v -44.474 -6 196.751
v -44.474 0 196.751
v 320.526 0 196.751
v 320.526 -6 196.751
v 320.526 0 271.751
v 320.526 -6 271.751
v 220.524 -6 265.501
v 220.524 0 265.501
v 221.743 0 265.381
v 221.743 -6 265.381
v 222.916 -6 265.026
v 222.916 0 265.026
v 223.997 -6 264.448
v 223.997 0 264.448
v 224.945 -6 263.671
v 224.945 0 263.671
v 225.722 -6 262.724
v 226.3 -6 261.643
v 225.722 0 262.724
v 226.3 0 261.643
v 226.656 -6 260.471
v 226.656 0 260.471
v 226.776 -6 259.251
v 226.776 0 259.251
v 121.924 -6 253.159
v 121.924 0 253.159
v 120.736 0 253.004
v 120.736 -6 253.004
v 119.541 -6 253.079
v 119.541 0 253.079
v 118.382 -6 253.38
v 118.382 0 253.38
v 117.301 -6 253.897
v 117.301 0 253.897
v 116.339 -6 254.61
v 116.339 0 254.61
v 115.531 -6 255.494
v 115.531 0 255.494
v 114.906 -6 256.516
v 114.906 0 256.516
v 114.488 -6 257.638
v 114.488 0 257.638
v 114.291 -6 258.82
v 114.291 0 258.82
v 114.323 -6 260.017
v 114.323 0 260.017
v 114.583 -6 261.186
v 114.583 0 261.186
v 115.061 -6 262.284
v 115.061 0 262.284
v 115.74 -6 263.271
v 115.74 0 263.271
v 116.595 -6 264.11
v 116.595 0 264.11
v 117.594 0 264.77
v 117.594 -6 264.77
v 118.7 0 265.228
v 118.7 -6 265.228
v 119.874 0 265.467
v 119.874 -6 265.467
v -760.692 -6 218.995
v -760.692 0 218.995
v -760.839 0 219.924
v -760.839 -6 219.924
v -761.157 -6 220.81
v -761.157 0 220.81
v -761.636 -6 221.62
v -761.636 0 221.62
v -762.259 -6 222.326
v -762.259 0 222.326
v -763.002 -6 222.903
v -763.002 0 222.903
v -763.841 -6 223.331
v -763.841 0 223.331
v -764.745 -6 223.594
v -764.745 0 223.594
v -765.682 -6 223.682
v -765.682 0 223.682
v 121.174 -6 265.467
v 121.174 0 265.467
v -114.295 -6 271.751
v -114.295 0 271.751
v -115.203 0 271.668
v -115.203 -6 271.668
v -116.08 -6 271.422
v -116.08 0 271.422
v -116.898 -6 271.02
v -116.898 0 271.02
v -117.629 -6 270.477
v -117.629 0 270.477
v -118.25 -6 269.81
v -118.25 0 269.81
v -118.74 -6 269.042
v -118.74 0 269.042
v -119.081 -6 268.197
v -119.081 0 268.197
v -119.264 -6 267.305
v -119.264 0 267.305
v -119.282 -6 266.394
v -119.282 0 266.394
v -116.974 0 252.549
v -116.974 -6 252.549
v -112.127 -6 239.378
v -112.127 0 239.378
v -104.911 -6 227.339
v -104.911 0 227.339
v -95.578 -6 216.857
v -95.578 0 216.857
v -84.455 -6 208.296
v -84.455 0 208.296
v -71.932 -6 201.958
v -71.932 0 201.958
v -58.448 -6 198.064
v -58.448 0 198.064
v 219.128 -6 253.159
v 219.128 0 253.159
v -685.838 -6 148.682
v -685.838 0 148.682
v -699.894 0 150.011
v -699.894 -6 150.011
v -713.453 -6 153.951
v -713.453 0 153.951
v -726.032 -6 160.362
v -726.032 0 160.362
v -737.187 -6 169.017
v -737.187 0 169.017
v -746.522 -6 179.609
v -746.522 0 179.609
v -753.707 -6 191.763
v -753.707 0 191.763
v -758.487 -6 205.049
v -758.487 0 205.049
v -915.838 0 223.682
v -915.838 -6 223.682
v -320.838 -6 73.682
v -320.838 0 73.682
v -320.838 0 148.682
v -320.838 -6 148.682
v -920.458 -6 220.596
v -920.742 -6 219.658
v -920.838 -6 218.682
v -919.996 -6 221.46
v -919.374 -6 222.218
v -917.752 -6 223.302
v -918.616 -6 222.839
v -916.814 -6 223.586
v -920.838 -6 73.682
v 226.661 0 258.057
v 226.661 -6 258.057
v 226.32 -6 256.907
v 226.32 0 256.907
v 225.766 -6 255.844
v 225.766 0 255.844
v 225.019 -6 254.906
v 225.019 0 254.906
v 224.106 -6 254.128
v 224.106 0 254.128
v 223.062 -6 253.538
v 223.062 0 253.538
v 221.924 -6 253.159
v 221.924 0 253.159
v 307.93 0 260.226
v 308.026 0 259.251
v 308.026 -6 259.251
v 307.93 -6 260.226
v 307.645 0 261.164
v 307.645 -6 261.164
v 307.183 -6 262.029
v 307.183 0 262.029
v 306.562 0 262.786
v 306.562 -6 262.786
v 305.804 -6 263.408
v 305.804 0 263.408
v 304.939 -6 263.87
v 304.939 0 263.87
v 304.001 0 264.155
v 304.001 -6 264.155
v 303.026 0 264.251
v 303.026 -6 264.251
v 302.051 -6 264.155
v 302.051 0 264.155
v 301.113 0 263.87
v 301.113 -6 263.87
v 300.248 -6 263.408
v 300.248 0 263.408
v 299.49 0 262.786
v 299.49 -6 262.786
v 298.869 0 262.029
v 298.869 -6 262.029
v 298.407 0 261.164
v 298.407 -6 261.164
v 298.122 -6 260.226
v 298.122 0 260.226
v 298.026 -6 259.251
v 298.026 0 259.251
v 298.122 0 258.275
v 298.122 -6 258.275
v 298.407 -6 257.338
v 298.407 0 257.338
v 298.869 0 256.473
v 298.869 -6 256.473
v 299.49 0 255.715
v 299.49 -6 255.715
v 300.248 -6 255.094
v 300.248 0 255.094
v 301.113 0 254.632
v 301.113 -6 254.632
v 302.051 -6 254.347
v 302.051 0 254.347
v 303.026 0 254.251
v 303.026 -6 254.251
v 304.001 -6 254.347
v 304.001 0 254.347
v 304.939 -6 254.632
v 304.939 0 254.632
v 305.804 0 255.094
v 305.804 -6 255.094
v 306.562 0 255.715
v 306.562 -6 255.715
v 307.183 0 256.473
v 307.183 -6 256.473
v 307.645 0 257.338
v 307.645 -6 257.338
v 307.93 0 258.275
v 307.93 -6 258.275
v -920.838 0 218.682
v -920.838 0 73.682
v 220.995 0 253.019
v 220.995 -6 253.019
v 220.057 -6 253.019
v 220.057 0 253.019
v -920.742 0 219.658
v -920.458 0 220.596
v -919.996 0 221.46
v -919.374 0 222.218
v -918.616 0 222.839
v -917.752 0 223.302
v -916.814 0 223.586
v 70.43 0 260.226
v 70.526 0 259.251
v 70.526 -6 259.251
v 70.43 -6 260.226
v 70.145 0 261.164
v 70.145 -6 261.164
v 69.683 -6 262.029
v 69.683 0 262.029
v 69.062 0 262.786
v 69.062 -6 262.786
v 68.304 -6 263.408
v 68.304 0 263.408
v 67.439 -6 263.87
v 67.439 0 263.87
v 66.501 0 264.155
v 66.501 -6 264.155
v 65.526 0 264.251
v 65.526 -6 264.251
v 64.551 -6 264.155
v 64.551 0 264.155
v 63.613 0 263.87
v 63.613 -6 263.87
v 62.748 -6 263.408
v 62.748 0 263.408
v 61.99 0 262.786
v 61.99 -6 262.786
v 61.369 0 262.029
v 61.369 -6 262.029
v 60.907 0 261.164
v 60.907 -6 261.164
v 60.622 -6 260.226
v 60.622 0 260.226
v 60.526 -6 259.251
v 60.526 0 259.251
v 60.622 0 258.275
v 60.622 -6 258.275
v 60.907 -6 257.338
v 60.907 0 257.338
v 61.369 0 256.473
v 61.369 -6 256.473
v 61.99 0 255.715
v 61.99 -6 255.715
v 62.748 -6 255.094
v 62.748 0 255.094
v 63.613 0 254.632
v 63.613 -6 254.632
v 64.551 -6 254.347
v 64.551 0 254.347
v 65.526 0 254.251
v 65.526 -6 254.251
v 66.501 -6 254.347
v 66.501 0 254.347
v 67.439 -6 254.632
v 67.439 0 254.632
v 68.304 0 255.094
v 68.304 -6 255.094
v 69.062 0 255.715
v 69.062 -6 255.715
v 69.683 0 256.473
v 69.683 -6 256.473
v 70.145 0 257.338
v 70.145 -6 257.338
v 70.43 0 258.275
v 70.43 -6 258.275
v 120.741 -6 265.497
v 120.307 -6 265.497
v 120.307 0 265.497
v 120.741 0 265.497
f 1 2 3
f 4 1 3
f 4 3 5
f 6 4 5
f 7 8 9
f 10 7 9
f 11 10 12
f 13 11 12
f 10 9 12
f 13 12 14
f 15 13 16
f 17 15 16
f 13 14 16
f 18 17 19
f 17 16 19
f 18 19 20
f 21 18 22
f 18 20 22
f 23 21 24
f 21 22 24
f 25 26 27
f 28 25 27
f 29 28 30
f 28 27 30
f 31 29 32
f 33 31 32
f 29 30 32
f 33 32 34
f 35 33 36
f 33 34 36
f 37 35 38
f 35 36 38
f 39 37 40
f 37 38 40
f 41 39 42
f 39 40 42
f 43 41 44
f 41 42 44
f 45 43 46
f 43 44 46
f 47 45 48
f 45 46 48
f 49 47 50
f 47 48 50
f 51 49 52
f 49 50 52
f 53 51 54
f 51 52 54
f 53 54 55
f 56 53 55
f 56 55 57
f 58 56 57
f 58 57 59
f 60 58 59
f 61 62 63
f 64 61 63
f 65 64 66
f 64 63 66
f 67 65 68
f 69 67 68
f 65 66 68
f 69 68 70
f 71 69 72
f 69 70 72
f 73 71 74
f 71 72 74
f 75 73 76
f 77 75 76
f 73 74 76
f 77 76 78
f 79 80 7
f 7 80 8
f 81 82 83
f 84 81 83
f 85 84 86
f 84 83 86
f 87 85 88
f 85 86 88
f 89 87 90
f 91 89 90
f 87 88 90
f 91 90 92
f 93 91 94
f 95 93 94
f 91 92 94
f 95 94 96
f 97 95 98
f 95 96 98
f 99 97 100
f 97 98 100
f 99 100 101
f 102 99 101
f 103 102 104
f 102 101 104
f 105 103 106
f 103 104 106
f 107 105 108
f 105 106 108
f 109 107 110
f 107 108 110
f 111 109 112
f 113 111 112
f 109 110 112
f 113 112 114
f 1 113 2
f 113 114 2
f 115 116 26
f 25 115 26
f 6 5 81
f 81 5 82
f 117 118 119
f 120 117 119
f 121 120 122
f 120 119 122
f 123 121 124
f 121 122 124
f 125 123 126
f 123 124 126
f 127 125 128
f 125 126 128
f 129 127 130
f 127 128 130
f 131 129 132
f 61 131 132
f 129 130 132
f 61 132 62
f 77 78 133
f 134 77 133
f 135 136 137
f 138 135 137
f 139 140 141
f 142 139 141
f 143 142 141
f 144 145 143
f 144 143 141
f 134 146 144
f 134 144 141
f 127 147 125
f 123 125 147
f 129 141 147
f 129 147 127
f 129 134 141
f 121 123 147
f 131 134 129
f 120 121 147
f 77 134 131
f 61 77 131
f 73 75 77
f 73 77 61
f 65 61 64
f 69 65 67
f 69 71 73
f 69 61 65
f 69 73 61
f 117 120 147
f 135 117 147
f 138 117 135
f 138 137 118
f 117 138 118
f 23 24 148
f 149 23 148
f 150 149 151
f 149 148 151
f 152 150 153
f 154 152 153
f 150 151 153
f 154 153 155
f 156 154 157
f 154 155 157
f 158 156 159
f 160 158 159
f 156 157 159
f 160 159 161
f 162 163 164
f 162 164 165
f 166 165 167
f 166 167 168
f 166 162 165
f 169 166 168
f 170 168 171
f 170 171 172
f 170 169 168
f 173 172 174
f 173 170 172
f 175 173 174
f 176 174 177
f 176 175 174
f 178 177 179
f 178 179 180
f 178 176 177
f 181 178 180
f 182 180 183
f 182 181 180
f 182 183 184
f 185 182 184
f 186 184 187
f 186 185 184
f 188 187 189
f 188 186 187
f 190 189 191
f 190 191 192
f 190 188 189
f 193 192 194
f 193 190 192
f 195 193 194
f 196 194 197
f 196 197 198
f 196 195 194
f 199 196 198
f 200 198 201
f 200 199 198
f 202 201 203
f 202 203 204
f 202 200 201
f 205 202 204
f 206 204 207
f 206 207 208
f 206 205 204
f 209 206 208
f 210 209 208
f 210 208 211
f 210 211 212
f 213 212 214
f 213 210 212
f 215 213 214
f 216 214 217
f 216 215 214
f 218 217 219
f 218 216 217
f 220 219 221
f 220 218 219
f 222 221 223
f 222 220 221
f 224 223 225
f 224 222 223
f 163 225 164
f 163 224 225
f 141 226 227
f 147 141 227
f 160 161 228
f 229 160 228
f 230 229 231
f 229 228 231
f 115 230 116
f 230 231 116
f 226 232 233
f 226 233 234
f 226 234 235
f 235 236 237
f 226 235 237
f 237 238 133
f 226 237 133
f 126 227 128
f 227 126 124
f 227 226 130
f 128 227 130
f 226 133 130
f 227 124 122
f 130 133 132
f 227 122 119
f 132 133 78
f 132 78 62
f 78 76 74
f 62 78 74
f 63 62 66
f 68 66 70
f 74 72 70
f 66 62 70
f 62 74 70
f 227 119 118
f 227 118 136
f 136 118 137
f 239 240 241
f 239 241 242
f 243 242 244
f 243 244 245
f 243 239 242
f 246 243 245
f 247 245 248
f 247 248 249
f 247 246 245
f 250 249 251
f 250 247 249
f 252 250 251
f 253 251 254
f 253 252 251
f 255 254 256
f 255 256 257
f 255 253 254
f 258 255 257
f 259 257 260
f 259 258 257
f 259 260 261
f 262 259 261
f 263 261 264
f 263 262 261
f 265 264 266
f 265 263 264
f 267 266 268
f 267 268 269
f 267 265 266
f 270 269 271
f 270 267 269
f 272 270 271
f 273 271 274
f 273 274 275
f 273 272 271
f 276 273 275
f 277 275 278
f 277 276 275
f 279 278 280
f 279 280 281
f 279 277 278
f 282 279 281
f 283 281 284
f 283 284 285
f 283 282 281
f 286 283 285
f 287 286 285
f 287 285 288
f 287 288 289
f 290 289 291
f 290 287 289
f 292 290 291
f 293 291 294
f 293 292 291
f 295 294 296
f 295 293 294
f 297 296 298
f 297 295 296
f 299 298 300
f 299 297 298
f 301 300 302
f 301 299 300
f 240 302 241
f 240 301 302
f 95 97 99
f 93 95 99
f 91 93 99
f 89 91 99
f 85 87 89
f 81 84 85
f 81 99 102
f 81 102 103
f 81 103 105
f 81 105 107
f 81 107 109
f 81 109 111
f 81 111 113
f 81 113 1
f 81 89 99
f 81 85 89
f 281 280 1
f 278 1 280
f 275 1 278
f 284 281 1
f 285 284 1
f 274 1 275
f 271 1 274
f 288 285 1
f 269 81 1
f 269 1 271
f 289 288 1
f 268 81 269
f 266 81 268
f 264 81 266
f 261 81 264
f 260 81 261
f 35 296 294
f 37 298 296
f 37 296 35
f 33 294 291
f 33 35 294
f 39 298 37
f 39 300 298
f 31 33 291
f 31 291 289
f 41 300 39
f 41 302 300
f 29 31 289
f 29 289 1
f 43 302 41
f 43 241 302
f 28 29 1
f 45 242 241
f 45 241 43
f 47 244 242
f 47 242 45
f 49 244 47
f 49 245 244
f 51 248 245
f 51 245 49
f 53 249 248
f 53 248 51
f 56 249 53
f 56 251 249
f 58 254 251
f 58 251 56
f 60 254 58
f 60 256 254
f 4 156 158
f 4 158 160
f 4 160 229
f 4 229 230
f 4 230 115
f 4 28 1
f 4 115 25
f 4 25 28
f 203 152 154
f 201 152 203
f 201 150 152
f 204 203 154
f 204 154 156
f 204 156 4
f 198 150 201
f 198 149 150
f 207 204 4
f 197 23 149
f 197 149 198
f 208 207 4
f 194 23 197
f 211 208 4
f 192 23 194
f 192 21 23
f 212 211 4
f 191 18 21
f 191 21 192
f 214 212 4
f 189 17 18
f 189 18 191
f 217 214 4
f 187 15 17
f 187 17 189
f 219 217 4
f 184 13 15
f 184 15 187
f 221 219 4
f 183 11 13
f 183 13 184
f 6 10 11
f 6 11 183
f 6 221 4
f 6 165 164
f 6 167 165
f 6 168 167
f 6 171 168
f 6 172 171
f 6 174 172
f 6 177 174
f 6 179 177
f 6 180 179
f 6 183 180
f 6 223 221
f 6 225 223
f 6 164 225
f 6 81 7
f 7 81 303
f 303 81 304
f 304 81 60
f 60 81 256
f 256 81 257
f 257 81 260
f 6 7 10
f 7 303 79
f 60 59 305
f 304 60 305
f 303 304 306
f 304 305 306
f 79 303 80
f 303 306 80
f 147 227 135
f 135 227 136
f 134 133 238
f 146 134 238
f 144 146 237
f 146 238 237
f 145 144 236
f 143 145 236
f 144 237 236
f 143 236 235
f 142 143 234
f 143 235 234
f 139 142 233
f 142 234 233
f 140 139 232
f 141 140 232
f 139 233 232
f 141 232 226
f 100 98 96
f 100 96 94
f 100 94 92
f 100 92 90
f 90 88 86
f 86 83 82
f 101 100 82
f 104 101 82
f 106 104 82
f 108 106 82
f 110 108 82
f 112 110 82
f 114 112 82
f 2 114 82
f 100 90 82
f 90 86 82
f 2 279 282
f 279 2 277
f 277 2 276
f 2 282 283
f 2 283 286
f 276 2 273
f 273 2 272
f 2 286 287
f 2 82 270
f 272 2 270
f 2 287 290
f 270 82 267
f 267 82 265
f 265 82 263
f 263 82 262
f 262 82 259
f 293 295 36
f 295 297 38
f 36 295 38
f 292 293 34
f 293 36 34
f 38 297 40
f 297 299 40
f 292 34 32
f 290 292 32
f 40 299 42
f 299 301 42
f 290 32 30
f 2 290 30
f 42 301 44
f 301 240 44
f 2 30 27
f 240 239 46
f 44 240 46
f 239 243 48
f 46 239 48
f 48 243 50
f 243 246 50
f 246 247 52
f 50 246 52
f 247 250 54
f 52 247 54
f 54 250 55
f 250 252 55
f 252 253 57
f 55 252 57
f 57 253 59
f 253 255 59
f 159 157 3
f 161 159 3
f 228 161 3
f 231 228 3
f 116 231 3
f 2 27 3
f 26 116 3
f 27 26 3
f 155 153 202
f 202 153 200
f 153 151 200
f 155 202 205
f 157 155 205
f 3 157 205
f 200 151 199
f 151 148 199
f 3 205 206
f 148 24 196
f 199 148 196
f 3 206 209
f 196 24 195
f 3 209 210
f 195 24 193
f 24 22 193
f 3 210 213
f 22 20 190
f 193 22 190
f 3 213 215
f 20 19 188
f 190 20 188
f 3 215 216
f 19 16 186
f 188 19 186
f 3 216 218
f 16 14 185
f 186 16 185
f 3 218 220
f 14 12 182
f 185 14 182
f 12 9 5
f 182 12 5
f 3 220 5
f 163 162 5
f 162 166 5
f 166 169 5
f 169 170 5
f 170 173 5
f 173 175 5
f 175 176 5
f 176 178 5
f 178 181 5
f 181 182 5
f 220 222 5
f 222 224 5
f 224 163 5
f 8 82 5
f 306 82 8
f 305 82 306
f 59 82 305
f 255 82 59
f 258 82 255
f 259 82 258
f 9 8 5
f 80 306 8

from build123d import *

# Parameters (mm, degrees)
F0_R     = 5
F1_DEPTH = 6


with BuildPart() as f1:
    # F0 (on Front) → F1 (new body)
    with BuildSketch(Plane.XZ):
        with BuildLine():
            Line((-920.83818, 218.68212), (-920.83818, 73.68212))
            Line((-920.83818, 73.68212), (-320.83818, 73.68212))
            Line((-320.83818, 73.68212), (-320.83818, 148.68212))
            Line((-320.83818, 148.68212), (-395.83818, 148.68212))
            Line((-395.83818, 148.68212), (-685.83818, 148.68212))
            ThreePointArc((-685.83818, 148.68212), (-737.18717, 169.016946), (-760.691552, 218.99462))
            ThreePointArc((-760.691552, 218.99462), (-762.258511, 222.326465), (-765.681777, 223.68212))
            Line((-765.681777, 223.68212), (-915.83818, 223.68212))
            ThreePointArc((-915.83818, 223.68212), (-919.373714, 222.217654), (-920.83818, 218.68212))
        make_face()
        with BuildLine():
            Line((-44.474023, 196.750934), (245.525977, 196.750934))
            Line((245.525977, 196.750934), (320.525977, 196.750934))
            Line((320.525977, 196.750934), (320.525977, 271.750934))
            Line((320.525977, 271.750934), (-114.295223, 271.750934))
            ThreePointArc((-114.295223, 271.750934), (-117.954848, 270.15786), (-119.282451, 266.393791))
            ThreePointArc((-119.282451, 266.393791), (-95.577908, 216.856555), (-44.474023, 196.750934))
        make_face()
        with Locations((65.525977, 259.250934)):
            Circle(F0_R, mode=Mode.SUBTRACT)
        with BuildLine():
            ThreePointArc((121.923759, 253.159242), (114.360898, 258.224145), (119.87394, 265.466829))
            ThreePointArc((119.87394, 265.466829), (120.52386, 265.500934), (121.173802, 265.467269))
            Line((121.173802, 265.467269), (220.52386, 265.500934))
            ThreePointArc((220.52386, 265.500934), (224.944646, 263.6711), (226.775977, 259.250934))
            ThreePointArc((226.775977, 259.250934), (225.41467, 255.356941), (221.923759, 253.159242))
            ThreePointArc((221.923759, 253.159242), (220.525977, 253.000934), (219.128195, 253.159242))
            Line((219.128195, 253.159242), (121.923759, 253.159242))
        make_face(mode=Mode.SUBTRACT)
        with Locations((303.025977, 259.250934)):
            Circle(F0_R, mode=Mode.SUBTRACT)
    extrude(amount=F1_DEPTH)


solid = f1.part
